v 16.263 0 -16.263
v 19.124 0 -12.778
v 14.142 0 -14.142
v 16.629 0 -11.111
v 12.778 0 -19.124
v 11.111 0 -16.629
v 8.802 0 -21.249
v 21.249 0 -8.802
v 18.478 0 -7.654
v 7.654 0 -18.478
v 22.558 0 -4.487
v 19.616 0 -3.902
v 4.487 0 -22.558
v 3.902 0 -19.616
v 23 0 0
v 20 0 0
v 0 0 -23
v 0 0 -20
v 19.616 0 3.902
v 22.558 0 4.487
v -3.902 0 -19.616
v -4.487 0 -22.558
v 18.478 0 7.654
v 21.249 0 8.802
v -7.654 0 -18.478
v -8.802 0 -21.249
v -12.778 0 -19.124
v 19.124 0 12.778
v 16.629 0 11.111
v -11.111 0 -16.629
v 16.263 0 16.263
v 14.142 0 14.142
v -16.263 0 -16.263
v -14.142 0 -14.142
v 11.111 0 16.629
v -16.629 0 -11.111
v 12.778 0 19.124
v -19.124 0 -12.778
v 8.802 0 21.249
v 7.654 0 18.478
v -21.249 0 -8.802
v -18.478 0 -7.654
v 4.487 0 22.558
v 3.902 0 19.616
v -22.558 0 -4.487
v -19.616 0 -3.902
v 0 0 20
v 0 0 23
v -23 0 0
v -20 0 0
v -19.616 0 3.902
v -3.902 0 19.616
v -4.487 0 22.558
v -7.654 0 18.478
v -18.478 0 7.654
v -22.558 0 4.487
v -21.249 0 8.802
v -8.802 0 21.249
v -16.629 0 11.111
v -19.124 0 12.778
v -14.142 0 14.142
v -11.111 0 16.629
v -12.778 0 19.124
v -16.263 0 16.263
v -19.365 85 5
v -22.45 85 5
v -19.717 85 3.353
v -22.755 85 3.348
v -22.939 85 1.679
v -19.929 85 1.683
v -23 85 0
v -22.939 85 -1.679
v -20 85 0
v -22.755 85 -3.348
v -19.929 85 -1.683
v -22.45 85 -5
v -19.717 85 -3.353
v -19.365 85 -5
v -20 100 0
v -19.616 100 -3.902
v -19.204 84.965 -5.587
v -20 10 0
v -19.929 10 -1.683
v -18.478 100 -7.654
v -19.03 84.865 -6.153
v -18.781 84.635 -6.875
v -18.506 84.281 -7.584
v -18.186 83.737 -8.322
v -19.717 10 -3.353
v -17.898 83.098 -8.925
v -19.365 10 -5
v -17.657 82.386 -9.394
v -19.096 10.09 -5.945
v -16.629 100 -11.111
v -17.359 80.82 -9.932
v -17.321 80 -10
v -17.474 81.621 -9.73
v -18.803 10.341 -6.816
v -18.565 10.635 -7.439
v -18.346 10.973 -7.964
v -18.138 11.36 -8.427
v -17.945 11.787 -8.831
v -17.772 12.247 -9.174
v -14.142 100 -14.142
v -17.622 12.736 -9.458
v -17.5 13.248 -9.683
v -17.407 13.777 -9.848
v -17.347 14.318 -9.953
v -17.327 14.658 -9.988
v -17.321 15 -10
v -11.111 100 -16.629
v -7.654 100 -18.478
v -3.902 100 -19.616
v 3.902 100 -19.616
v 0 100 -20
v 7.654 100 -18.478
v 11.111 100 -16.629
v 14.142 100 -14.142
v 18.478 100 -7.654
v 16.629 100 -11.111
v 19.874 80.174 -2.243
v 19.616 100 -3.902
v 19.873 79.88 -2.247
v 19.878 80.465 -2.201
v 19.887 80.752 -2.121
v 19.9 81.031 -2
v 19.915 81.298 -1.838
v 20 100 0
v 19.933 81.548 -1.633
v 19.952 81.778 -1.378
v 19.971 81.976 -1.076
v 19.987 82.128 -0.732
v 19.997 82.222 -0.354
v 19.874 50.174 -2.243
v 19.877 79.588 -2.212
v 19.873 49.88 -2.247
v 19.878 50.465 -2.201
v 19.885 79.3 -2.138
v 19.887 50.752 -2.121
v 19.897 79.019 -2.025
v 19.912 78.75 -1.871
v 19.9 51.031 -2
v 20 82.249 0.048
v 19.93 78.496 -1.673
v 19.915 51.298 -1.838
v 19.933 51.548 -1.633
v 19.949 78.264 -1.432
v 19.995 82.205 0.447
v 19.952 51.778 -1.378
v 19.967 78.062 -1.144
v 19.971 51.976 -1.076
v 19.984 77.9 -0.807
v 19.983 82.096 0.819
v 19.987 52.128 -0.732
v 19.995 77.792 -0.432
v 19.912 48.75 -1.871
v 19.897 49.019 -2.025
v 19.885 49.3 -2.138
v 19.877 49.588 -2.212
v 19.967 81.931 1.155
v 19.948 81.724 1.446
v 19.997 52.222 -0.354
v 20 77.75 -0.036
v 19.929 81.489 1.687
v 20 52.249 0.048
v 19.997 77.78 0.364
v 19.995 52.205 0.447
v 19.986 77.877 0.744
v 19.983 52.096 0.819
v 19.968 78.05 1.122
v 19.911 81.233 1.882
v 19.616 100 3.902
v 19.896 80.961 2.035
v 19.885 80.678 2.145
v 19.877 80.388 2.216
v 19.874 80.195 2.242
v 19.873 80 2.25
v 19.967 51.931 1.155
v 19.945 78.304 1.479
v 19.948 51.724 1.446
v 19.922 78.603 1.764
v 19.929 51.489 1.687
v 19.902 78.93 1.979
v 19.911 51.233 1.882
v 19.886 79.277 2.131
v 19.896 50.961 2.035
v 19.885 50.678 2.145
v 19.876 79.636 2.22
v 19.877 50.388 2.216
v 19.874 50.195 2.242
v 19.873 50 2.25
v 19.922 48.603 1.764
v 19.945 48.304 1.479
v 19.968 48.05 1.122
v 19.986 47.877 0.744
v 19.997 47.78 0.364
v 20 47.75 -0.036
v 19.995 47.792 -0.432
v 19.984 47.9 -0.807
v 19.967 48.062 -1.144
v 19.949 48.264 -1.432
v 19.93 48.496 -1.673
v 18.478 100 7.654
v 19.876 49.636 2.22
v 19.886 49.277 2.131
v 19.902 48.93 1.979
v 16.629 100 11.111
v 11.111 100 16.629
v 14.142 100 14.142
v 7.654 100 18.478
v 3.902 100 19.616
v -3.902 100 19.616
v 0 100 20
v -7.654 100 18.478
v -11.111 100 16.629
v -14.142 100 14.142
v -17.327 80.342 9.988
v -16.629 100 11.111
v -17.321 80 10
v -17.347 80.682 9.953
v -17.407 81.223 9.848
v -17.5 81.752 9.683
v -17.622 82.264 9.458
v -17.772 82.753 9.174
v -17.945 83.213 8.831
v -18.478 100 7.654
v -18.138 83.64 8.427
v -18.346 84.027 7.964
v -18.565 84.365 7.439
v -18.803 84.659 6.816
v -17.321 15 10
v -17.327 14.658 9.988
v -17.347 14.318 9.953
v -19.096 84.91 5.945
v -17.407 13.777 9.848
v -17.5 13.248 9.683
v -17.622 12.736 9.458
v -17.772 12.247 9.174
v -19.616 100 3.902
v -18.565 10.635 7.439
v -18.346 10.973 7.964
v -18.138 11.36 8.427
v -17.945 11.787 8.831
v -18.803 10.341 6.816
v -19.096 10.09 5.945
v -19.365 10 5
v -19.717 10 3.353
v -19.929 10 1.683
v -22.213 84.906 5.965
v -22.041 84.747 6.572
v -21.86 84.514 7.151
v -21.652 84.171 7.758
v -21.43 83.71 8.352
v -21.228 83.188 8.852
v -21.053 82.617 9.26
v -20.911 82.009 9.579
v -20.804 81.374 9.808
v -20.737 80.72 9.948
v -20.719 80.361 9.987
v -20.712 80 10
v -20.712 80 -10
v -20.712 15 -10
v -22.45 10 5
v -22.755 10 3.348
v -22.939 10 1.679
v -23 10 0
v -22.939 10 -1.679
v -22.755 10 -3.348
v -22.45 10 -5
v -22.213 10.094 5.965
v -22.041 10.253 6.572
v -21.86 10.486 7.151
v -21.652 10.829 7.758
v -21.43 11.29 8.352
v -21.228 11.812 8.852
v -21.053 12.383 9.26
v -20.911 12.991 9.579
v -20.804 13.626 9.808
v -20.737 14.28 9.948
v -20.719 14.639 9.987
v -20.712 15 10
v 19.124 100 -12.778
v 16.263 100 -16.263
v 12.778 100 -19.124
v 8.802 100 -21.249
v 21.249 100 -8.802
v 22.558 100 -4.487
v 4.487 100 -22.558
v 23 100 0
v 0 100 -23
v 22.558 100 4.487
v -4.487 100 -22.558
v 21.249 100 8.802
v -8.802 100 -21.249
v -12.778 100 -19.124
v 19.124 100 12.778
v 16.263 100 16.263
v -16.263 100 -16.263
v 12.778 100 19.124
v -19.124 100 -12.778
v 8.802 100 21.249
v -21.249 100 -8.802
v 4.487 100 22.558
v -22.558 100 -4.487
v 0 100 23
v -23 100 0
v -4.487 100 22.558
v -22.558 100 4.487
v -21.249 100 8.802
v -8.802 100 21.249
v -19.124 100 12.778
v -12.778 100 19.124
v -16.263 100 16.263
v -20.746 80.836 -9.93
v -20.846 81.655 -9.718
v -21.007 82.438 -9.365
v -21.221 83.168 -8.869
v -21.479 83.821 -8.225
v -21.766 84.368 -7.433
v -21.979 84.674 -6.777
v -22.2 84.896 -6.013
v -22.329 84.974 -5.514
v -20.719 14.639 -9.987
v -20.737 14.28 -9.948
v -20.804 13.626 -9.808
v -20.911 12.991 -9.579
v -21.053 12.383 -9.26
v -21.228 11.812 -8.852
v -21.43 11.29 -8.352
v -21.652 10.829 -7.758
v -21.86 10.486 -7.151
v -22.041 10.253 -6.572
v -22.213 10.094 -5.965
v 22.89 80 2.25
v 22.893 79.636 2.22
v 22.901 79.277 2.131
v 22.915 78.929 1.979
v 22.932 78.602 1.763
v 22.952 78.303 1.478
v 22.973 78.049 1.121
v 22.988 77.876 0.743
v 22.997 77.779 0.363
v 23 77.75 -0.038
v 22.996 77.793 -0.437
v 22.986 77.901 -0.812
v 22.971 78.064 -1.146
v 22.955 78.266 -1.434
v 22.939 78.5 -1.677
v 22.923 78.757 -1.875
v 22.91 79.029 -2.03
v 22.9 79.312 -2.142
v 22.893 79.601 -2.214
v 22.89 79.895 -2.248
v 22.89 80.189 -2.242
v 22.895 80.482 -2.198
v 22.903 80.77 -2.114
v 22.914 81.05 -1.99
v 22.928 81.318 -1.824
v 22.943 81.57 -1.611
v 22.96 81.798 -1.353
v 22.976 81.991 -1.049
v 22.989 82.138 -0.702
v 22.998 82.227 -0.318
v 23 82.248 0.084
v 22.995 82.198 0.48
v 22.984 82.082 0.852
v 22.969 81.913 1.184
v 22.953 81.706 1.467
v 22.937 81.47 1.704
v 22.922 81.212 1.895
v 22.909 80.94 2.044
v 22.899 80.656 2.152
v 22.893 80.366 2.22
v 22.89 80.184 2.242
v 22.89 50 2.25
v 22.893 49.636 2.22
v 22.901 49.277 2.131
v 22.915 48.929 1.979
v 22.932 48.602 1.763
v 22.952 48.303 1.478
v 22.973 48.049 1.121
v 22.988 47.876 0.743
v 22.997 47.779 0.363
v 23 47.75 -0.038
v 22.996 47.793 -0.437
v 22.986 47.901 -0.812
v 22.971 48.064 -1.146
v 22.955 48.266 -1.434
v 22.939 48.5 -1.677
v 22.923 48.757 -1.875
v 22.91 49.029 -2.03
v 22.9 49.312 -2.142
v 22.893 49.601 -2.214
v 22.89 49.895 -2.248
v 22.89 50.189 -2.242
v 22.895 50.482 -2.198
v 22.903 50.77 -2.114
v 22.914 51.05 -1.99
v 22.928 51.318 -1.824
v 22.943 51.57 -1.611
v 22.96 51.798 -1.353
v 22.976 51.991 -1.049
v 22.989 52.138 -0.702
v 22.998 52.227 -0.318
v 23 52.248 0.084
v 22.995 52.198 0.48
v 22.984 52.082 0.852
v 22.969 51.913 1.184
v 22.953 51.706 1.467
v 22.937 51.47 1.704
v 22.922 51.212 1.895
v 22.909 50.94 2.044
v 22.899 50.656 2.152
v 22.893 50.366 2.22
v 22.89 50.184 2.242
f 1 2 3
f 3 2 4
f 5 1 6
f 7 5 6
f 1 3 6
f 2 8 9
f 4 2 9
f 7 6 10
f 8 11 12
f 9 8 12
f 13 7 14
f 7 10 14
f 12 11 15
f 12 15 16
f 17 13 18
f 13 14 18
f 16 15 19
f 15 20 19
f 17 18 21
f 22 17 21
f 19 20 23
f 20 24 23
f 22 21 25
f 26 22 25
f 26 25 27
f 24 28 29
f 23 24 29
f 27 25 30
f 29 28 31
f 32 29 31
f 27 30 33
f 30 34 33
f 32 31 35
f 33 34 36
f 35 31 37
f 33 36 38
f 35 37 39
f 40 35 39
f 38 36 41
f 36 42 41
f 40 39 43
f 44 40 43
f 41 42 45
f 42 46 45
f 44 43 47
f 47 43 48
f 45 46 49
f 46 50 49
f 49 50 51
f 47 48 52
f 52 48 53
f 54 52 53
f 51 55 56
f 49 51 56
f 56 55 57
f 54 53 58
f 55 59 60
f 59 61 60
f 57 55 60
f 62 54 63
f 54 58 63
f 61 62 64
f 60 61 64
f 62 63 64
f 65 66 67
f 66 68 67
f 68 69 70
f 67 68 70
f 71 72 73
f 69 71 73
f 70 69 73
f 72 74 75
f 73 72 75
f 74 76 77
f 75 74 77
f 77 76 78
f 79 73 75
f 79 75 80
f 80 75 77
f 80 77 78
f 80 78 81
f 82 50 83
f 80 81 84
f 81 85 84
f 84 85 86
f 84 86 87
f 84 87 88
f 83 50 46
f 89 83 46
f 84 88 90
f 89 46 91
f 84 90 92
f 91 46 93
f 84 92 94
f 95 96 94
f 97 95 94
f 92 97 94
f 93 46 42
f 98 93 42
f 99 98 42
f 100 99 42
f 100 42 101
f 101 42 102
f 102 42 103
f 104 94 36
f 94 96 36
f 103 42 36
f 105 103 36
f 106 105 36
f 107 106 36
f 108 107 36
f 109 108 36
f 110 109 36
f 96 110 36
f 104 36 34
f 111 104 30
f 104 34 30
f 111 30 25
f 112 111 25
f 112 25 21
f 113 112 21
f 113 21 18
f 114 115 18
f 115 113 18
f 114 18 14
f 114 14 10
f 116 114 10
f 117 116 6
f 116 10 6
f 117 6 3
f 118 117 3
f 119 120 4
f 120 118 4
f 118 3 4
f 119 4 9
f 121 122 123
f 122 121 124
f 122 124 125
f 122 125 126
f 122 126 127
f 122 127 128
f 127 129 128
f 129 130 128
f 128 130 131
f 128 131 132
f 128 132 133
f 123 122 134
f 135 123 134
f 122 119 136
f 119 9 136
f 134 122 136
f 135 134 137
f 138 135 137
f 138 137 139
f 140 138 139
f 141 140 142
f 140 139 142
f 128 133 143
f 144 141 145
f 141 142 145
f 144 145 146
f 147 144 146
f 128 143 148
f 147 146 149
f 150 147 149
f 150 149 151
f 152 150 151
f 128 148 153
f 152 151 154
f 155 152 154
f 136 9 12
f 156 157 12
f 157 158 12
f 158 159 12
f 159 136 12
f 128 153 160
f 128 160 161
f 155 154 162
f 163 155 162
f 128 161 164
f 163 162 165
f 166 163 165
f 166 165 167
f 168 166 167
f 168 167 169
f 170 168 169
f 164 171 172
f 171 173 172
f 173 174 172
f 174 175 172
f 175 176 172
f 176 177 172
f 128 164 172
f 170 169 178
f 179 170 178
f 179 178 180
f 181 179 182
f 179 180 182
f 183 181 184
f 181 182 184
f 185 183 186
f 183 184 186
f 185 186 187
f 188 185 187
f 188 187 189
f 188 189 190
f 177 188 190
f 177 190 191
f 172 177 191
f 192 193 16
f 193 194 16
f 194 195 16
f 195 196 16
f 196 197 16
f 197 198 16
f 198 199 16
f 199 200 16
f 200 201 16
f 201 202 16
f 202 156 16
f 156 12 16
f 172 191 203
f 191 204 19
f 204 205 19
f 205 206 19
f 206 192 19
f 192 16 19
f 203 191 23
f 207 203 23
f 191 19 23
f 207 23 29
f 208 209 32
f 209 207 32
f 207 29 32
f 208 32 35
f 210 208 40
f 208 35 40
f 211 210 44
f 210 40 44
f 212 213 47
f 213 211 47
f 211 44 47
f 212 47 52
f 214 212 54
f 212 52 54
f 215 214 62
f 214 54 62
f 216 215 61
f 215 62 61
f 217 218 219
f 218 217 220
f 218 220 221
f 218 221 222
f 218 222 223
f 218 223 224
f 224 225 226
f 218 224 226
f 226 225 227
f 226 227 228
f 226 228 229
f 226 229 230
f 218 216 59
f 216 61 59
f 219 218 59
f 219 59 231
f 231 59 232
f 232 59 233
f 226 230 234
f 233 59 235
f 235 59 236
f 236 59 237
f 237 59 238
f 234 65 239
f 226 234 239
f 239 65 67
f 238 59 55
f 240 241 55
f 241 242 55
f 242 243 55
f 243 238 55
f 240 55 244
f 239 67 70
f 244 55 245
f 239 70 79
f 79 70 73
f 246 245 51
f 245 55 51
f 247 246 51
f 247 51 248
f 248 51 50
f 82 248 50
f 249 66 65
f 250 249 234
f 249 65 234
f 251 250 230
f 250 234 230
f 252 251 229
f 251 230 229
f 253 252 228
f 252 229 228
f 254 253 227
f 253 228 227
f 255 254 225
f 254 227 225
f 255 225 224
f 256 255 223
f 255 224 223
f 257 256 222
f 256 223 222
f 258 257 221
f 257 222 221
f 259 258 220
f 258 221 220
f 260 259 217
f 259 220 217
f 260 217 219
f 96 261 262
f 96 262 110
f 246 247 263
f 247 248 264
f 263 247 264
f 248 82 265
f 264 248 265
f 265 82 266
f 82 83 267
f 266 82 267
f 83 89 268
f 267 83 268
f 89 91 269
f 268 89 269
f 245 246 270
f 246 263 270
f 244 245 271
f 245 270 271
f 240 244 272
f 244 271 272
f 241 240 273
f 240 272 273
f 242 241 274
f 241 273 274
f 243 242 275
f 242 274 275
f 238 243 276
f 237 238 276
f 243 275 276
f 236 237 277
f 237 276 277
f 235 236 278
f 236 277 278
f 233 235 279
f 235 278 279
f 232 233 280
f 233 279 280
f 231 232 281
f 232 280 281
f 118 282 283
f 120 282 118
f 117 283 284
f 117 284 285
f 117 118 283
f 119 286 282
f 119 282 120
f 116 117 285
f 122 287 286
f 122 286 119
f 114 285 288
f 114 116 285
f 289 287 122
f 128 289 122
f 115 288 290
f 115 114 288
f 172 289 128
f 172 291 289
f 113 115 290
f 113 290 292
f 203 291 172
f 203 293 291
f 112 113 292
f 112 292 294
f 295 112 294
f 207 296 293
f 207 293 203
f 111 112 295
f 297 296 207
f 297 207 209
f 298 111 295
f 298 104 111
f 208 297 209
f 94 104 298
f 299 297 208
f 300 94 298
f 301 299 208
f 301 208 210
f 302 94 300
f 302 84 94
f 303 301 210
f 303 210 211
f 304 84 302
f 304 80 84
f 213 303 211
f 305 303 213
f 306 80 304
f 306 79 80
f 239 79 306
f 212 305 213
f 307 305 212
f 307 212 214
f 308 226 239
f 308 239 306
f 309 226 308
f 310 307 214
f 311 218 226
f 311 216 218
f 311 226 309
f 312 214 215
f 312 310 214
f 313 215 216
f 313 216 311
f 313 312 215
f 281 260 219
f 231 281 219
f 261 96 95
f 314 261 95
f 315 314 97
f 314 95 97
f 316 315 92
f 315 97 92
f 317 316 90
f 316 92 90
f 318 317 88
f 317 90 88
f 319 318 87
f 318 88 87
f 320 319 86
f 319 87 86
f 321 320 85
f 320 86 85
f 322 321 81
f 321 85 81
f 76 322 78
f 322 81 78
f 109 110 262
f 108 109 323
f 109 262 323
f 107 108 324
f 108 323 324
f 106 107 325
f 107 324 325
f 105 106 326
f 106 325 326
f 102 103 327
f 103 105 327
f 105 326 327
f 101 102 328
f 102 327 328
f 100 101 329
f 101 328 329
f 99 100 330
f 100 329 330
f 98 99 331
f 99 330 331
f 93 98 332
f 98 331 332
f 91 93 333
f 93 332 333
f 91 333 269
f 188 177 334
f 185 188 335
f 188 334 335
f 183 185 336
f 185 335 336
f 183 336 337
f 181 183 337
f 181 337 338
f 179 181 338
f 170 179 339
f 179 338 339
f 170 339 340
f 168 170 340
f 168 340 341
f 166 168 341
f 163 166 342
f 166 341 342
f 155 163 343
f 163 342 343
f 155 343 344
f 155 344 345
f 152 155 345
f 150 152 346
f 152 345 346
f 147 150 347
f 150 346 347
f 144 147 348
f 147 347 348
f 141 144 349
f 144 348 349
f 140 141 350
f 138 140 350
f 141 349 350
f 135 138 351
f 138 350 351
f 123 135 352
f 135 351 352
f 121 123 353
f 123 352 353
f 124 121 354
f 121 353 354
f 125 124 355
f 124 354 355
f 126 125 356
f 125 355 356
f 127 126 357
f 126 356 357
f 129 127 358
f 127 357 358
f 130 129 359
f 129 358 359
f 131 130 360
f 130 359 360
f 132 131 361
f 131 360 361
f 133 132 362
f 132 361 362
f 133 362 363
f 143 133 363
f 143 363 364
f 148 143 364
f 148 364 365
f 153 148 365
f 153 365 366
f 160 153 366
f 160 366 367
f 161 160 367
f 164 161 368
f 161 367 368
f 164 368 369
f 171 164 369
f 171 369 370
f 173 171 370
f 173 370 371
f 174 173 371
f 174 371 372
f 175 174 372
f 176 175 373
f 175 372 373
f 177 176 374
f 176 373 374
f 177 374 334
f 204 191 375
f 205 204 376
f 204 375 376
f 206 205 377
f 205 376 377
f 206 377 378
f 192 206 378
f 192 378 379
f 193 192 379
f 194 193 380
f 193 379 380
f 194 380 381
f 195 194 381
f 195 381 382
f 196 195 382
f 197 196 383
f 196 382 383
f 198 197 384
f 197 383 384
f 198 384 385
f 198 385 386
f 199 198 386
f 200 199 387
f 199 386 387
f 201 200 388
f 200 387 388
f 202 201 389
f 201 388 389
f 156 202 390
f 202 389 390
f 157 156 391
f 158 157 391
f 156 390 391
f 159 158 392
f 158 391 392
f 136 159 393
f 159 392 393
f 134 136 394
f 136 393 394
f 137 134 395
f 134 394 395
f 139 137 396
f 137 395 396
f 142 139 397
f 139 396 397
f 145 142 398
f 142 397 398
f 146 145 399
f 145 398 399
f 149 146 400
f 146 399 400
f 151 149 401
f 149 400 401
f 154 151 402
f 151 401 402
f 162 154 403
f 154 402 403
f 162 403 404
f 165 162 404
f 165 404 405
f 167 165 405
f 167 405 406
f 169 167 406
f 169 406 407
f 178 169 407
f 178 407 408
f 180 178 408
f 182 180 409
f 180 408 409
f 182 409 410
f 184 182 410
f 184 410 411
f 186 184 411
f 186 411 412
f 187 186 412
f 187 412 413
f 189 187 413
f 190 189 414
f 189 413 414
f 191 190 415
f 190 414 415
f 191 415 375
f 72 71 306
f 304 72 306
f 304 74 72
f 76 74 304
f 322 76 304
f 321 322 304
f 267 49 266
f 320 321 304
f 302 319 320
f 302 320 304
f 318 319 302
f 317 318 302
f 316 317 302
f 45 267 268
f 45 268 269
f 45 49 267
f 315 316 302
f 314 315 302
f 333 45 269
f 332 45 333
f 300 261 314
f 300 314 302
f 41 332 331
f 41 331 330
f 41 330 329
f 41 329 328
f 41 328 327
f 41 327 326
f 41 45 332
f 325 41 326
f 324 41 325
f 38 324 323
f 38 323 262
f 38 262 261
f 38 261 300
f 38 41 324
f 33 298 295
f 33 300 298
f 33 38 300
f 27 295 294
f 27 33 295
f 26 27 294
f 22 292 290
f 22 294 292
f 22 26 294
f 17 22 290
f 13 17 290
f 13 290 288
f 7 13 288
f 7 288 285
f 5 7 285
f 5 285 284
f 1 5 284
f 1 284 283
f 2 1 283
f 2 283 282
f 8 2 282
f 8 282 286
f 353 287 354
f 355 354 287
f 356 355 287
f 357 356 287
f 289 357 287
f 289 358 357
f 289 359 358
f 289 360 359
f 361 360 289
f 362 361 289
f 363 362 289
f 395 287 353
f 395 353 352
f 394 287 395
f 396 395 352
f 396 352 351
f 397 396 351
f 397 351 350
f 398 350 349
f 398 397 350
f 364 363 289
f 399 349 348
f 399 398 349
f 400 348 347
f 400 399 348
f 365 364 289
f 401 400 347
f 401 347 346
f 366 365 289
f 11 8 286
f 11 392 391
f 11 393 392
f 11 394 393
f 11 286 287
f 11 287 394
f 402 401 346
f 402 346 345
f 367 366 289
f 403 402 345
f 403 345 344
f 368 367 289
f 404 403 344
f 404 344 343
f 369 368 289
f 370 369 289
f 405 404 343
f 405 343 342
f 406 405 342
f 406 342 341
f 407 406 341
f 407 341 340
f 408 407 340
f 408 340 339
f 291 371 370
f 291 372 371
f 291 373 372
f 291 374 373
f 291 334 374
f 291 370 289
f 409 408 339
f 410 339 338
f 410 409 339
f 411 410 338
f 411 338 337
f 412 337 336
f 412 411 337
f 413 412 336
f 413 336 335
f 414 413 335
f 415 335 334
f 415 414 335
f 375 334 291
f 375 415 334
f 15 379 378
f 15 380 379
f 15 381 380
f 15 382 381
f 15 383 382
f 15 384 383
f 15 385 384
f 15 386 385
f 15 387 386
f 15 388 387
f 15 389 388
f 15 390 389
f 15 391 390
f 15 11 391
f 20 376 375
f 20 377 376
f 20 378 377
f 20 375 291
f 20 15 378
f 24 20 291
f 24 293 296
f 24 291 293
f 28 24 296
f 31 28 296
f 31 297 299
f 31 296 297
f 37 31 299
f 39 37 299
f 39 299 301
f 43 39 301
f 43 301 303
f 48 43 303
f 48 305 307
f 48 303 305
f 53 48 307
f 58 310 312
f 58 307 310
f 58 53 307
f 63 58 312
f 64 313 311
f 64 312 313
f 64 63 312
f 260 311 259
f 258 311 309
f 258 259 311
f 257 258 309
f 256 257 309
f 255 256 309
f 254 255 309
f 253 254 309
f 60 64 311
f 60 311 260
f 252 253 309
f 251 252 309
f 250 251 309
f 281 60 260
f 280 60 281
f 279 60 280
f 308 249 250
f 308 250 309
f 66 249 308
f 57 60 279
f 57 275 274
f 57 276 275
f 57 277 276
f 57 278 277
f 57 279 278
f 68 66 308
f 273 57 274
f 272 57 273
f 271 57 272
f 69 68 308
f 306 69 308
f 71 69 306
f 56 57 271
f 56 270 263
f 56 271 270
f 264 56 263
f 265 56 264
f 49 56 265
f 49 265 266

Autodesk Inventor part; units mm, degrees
ref_plane "YZ Plane" through (0, 0, 0) normal (1, 0, 0) x (0, 1, 0)
ref_plane "XZ Plane" through (0, 0, 0) normal (0, 1, 0) x (-1, 0, 0)
ref_plane "XY Plane" through (0, 0, 0) normal (0, 0, 1) x (1, 0, 0)
sketch "Sketch1" plane through (0, 0, 0) normal (0, 1, 0) x (-1, 0, 0)
  circle A0 centre (0, 0) radius 23
  circle A1 centre (0, 0) radius 20
  dimension "d0" = 3
  dimension "d1" = 40
extrude "Extrusion1" add sketch "Sketch1" along normal blind 100
sketch "Sketch2" plane through (0, 0, 0) normal (0, 0, 1) x (1, 0, 0)
  line L0 (-23, 85) -> (0, 85)
  line L1 (0, 85) -> (0, 10)
  line L2 (0, 10) -> (-23, 10)
  line L3 (-23, 10) -> (-23, 85)
  line L4 (23, 100) -> (-23, 100) projected
  line L5 (-23, 0) -> (23, 0) projected
  point P0 (0, 0)
  dimension "d4" = 75
  dimension "d5" = 10
extrude "Extrusion2" cut sketch "Sketch2" along normal mid plane 20
fillet "Fillet1" radius 5 4 edges at (-19.0164, 85, -10) (-19.0164, 85, 10) (-19.0164, 10, 10) (-19.0164, 10, -10)
sketch "Sketch3" plane through (0, 0, 0) normal (1, 0, 0) x (0, 1, 0)
  line L0 (-20, 0) -> (120, 0) projected
  line L1 (85, -5) -> (85, 5) projected
  line L2 (100, 20) -> (100, -20) projected
  point P0 (0, 0)
  point P1 (80, 0)
  point P2 (50, 0)
  dimension "d9" = 30
  dimension "d18" = 20
hole "Hole1" at (0, 80, 0) at (0, 50, 0) direction (1, 0, 0) diameter 4.5 end through all clearance for "Socket Head Cap Screw" size "M4" standard "Ansi Metric M Profile"
properties part number "Pancake_PVC Pipe" material "PVC-Piping"
